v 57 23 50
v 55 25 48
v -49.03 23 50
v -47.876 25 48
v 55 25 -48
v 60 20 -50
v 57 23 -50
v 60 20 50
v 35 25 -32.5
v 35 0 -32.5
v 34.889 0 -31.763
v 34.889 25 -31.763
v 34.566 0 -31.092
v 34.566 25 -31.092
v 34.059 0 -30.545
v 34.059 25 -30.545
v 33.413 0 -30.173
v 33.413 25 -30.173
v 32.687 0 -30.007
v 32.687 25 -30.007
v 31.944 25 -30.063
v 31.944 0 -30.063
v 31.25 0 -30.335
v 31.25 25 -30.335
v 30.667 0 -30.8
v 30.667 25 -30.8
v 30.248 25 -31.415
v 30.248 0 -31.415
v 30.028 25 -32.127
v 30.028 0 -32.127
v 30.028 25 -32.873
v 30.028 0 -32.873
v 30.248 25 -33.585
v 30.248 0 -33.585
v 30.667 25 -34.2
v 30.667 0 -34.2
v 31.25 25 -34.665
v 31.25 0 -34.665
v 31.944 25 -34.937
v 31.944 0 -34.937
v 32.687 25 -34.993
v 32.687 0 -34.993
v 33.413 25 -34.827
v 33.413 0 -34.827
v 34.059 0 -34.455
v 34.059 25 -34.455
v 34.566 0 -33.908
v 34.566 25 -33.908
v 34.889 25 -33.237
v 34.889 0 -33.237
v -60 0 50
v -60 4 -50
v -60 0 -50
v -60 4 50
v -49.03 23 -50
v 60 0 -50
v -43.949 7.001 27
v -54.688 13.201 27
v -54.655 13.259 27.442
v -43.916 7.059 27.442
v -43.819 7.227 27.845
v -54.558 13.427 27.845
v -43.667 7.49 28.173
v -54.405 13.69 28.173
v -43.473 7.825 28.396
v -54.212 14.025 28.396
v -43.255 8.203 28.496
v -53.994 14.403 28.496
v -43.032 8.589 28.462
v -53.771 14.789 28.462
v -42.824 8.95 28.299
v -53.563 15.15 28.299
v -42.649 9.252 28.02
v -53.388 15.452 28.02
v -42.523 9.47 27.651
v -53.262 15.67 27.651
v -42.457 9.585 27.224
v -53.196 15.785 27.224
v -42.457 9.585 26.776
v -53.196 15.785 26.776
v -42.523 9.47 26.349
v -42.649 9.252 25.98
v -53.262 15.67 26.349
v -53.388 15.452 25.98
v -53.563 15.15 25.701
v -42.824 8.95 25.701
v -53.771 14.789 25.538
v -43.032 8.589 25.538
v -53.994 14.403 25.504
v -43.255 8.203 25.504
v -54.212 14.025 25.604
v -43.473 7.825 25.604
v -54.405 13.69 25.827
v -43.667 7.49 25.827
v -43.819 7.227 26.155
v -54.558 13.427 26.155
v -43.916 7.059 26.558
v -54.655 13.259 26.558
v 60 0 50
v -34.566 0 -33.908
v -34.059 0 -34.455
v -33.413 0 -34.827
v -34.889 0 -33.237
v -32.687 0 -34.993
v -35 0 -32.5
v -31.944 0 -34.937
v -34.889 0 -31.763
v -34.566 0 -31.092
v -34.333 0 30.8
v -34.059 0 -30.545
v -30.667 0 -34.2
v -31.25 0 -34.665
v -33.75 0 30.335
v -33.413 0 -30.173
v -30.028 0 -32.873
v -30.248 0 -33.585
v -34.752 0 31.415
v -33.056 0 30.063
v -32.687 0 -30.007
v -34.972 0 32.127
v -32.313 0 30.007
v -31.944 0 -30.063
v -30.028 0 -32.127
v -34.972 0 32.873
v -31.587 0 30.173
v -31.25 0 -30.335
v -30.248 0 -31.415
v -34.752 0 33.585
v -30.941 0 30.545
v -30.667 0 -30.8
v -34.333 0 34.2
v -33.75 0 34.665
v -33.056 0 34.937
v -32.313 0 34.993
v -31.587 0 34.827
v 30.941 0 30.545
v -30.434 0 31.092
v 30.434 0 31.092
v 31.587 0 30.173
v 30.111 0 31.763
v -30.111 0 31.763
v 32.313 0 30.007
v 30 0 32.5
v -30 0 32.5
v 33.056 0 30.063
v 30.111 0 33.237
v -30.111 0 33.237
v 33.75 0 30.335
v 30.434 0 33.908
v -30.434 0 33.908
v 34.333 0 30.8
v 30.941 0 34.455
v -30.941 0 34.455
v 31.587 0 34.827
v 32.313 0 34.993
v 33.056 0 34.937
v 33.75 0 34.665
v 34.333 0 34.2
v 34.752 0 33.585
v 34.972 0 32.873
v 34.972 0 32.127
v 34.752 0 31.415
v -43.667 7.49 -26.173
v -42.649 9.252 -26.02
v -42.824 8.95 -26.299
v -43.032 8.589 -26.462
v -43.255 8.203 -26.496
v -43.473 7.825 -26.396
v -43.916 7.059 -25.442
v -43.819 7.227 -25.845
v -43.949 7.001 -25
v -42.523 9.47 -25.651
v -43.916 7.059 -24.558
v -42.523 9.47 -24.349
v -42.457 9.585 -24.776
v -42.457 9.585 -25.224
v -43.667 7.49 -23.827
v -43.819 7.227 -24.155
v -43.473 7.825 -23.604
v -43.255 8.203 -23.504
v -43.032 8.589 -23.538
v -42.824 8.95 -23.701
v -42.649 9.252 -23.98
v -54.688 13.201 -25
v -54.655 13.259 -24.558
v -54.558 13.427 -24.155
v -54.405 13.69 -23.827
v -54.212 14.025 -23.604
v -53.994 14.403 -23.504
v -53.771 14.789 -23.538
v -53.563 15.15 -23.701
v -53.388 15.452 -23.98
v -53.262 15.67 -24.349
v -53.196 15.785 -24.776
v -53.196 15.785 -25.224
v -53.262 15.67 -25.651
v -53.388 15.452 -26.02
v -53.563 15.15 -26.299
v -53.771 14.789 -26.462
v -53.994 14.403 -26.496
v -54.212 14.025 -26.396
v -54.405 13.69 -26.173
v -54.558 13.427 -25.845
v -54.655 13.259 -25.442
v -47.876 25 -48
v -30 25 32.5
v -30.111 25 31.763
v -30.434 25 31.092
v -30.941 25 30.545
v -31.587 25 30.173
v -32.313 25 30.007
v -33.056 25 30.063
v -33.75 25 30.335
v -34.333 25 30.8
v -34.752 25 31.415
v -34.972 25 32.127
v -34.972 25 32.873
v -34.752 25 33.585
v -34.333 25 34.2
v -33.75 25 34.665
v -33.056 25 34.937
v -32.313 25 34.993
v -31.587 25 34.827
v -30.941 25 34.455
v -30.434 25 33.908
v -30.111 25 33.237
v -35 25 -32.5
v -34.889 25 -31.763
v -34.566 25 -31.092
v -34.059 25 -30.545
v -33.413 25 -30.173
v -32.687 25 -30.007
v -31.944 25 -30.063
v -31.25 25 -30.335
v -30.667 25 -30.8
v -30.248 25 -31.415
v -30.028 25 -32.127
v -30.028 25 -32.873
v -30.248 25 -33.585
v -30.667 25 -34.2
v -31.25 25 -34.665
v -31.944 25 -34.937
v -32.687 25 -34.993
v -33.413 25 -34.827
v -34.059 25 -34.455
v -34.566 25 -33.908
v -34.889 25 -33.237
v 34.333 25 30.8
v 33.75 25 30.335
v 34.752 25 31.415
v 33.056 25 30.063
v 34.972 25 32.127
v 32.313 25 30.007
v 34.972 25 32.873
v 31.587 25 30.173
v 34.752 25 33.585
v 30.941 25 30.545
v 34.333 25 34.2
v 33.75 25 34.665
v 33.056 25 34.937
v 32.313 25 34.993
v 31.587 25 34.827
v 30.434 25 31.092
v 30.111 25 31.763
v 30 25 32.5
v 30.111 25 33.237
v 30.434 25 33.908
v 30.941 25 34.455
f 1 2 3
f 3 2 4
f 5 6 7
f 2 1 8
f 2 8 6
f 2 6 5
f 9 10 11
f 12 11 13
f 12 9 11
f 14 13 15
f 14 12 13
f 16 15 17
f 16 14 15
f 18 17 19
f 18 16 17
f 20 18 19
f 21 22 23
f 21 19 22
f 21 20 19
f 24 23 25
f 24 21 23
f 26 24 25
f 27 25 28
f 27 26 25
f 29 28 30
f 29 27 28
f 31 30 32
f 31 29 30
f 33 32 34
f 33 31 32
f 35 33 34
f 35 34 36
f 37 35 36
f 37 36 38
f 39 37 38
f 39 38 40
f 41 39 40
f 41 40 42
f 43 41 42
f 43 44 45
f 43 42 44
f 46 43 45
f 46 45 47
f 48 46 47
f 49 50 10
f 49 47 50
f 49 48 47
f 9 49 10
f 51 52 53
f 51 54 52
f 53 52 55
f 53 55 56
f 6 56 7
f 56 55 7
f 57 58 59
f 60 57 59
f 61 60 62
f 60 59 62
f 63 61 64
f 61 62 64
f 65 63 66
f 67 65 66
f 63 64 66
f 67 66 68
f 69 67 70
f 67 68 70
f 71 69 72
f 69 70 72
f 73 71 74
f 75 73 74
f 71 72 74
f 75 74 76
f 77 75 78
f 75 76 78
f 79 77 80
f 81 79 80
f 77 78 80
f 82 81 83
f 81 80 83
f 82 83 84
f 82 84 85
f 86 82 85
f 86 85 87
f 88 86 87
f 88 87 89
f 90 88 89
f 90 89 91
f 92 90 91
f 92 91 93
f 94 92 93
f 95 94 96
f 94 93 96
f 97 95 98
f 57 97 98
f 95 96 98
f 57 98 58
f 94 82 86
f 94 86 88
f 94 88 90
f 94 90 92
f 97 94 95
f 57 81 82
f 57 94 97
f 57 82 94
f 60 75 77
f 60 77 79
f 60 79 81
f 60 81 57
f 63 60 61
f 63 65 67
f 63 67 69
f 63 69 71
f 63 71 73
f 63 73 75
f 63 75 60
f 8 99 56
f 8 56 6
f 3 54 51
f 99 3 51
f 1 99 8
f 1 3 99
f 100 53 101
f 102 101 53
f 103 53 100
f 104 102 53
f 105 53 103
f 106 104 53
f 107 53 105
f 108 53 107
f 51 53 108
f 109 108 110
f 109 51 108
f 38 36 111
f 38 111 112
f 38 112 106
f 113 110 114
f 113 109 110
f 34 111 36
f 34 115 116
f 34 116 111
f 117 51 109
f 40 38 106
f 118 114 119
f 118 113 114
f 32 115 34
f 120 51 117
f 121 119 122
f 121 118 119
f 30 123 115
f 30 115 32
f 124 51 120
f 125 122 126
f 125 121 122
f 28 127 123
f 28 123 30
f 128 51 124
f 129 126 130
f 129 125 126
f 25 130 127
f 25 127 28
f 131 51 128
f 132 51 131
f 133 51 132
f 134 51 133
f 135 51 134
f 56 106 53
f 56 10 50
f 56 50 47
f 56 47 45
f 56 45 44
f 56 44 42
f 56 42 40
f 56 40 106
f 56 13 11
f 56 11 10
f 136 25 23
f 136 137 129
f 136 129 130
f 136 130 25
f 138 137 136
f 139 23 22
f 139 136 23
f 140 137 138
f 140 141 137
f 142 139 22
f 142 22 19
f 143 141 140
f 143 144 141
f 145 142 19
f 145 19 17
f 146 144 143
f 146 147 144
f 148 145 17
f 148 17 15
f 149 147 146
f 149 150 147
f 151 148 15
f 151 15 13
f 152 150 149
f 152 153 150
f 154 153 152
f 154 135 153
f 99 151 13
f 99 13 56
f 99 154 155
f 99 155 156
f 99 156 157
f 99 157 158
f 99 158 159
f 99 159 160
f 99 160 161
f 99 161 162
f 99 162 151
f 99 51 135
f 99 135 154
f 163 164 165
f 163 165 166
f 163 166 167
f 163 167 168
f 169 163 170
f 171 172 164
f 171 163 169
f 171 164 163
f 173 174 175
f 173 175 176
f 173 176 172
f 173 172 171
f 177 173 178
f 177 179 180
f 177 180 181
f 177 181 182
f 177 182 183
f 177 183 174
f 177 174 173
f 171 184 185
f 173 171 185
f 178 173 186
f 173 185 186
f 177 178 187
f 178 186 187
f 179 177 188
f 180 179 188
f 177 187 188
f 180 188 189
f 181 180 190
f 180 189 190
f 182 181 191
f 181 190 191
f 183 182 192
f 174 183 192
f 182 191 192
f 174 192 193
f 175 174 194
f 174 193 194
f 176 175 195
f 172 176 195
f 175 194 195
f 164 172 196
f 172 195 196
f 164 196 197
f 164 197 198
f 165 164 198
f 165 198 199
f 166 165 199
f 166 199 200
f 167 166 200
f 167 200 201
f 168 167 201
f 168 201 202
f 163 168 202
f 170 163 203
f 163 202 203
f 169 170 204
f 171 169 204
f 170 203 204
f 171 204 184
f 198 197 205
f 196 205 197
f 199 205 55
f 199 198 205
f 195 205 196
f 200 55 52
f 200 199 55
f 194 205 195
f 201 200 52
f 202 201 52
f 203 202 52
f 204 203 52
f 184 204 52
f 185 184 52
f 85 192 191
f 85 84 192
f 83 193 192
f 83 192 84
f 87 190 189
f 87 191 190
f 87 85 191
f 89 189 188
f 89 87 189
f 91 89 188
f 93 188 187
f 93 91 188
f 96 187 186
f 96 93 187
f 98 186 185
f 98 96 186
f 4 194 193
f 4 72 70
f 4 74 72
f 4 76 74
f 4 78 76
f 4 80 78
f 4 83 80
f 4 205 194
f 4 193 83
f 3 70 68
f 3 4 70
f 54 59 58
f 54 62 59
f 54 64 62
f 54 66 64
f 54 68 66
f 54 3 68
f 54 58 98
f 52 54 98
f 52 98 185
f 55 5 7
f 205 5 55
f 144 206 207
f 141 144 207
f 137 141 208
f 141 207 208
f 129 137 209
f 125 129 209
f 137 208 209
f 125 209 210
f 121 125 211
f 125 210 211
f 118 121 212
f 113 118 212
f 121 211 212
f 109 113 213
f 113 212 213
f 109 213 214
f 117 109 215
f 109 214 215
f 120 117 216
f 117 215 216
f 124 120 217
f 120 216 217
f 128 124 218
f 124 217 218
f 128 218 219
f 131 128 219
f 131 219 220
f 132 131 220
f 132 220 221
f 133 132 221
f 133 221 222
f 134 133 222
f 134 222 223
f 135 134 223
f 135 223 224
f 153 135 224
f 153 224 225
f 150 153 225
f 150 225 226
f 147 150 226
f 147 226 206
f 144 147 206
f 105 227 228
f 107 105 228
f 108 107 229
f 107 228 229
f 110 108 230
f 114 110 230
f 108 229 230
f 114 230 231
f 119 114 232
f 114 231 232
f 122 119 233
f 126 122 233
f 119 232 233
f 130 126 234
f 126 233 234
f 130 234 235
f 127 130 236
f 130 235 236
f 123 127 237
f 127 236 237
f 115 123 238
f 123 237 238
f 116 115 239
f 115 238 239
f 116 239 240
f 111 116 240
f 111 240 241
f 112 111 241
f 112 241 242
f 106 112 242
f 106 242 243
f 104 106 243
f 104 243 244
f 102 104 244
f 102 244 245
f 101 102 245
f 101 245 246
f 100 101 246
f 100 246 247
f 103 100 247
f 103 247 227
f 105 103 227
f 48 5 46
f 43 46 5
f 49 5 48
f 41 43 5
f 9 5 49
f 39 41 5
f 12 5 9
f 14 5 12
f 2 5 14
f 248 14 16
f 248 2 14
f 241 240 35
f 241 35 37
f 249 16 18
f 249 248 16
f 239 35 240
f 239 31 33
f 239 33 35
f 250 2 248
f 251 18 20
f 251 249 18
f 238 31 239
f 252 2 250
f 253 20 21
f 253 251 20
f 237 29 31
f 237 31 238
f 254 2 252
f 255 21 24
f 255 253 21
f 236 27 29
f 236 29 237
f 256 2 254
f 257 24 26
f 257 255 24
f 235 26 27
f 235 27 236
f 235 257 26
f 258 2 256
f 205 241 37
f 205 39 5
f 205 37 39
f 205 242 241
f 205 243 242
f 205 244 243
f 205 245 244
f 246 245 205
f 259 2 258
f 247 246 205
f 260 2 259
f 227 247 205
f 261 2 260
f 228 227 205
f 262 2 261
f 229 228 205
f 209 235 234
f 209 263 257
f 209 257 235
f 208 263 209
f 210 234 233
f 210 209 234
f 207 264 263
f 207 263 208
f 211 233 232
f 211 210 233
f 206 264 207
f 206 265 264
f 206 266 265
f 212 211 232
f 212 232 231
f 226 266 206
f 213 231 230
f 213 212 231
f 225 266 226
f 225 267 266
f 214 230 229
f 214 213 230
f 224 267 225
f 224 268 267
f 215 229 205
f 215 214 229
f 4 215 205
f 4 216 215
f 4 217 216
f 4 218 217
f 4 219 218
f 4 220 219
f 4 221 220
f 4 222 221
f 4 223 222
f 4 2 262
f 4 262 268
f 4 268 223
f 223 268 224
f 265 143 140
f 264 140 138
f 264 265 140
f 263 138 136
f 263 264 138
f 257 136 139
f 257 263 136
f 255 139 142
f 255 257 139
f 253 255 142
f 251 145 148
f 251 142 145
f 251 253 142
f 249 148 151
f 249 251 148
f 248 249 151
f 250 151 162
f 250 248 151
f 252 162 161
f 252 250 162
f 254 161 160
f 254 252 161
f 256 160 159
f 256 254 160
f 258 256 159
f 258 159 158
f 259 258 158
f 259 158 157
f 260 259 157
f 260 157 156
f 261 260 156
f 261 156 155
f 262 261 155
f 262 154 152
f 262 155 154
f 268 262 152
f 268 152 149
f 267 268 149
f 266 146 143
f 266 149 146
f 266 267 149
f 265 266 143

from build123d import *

# Parameters (mm, degrees)
BOSS_EXTRUDE1_DEPTH = 50
SKETCH2_R           = 2.5
CUT_EXTRUDE1_DEPTH  = 83.006097334
SKETCH3_R           = 1.5
CUT_EXTRUDE2_DEPTH  = 12.4
CHAMFER1_SIZE       = 2


with BuildPart() as part:
    # Sketch1 → Boss-Extrude1 (new, symmetric)
    with BuildSketch(Plane.XY):
        Polygon((-60, 0), (60, 0), (60, 20), (55, 25), (-47.875644347, 25), (-60, 4), align=None)
    extrude(amount=BOSS_EXTRUDE1_DEPTH, both=True)

    # Sketch2 → Cut-Extrude1 (cut, through all)
    with BuildSketch(Plane(origin=(0, 25, 0), x_dir=(1, 0, 0), z_dir=(0, 1, 0))):
        with Locations(Location((-32.5, 32.5, 0), (0, 0, 180))):
            Circle(SKETCH2_R)
        with Locations((-32.5, -32.5)):
            Circle(SKETCH2_R)
    cut_extrude1 = extrude(amount=-CUT_EXTRUDE1_DEPTH, mode=Mode.SUBTRACT)

    # Mirror1: Cut-Extrude1 across plane
    add(cut_extrude1.mirror(Plane(origin=(0, 0, 0), x_dir=(0, 0, 1), z_dir=(1, 0, 0))), mode=Mode.SUBTRACT)

    # Sketch3 → Cut-Extrude2 (cut)
    with BuildSketch(Plane(origin=(-46.732050808, 26.980762114, 0), x_dir=(0, 0, 1), z_dir=(-0.8660254037844384, 0.5000000000000007, 0))):
        with Locations(Location((-25, -14.411542732, 0), (0, 0, 270))):
            Circle(SKETCH3_R)
        with Locations(Location((27, -14.411542732, 0), (0, 0, 270))):
            Circle(SKETCH3_R)
    extrude(amount=-CUT_EXTRUDE2_DEPTH, mode=Mode.SUBTRACT)

    # Chamfer1
    chamfer1_edges = [part.edges().sort_by_distance(p)[0] for p in [
        (3.562177826, 25, 50),
        (3.562177826, 25, -50),
    ]]
    chamfer(chamfer1_edges, length=CHAMFER1_SIZE)


solid = part.part
